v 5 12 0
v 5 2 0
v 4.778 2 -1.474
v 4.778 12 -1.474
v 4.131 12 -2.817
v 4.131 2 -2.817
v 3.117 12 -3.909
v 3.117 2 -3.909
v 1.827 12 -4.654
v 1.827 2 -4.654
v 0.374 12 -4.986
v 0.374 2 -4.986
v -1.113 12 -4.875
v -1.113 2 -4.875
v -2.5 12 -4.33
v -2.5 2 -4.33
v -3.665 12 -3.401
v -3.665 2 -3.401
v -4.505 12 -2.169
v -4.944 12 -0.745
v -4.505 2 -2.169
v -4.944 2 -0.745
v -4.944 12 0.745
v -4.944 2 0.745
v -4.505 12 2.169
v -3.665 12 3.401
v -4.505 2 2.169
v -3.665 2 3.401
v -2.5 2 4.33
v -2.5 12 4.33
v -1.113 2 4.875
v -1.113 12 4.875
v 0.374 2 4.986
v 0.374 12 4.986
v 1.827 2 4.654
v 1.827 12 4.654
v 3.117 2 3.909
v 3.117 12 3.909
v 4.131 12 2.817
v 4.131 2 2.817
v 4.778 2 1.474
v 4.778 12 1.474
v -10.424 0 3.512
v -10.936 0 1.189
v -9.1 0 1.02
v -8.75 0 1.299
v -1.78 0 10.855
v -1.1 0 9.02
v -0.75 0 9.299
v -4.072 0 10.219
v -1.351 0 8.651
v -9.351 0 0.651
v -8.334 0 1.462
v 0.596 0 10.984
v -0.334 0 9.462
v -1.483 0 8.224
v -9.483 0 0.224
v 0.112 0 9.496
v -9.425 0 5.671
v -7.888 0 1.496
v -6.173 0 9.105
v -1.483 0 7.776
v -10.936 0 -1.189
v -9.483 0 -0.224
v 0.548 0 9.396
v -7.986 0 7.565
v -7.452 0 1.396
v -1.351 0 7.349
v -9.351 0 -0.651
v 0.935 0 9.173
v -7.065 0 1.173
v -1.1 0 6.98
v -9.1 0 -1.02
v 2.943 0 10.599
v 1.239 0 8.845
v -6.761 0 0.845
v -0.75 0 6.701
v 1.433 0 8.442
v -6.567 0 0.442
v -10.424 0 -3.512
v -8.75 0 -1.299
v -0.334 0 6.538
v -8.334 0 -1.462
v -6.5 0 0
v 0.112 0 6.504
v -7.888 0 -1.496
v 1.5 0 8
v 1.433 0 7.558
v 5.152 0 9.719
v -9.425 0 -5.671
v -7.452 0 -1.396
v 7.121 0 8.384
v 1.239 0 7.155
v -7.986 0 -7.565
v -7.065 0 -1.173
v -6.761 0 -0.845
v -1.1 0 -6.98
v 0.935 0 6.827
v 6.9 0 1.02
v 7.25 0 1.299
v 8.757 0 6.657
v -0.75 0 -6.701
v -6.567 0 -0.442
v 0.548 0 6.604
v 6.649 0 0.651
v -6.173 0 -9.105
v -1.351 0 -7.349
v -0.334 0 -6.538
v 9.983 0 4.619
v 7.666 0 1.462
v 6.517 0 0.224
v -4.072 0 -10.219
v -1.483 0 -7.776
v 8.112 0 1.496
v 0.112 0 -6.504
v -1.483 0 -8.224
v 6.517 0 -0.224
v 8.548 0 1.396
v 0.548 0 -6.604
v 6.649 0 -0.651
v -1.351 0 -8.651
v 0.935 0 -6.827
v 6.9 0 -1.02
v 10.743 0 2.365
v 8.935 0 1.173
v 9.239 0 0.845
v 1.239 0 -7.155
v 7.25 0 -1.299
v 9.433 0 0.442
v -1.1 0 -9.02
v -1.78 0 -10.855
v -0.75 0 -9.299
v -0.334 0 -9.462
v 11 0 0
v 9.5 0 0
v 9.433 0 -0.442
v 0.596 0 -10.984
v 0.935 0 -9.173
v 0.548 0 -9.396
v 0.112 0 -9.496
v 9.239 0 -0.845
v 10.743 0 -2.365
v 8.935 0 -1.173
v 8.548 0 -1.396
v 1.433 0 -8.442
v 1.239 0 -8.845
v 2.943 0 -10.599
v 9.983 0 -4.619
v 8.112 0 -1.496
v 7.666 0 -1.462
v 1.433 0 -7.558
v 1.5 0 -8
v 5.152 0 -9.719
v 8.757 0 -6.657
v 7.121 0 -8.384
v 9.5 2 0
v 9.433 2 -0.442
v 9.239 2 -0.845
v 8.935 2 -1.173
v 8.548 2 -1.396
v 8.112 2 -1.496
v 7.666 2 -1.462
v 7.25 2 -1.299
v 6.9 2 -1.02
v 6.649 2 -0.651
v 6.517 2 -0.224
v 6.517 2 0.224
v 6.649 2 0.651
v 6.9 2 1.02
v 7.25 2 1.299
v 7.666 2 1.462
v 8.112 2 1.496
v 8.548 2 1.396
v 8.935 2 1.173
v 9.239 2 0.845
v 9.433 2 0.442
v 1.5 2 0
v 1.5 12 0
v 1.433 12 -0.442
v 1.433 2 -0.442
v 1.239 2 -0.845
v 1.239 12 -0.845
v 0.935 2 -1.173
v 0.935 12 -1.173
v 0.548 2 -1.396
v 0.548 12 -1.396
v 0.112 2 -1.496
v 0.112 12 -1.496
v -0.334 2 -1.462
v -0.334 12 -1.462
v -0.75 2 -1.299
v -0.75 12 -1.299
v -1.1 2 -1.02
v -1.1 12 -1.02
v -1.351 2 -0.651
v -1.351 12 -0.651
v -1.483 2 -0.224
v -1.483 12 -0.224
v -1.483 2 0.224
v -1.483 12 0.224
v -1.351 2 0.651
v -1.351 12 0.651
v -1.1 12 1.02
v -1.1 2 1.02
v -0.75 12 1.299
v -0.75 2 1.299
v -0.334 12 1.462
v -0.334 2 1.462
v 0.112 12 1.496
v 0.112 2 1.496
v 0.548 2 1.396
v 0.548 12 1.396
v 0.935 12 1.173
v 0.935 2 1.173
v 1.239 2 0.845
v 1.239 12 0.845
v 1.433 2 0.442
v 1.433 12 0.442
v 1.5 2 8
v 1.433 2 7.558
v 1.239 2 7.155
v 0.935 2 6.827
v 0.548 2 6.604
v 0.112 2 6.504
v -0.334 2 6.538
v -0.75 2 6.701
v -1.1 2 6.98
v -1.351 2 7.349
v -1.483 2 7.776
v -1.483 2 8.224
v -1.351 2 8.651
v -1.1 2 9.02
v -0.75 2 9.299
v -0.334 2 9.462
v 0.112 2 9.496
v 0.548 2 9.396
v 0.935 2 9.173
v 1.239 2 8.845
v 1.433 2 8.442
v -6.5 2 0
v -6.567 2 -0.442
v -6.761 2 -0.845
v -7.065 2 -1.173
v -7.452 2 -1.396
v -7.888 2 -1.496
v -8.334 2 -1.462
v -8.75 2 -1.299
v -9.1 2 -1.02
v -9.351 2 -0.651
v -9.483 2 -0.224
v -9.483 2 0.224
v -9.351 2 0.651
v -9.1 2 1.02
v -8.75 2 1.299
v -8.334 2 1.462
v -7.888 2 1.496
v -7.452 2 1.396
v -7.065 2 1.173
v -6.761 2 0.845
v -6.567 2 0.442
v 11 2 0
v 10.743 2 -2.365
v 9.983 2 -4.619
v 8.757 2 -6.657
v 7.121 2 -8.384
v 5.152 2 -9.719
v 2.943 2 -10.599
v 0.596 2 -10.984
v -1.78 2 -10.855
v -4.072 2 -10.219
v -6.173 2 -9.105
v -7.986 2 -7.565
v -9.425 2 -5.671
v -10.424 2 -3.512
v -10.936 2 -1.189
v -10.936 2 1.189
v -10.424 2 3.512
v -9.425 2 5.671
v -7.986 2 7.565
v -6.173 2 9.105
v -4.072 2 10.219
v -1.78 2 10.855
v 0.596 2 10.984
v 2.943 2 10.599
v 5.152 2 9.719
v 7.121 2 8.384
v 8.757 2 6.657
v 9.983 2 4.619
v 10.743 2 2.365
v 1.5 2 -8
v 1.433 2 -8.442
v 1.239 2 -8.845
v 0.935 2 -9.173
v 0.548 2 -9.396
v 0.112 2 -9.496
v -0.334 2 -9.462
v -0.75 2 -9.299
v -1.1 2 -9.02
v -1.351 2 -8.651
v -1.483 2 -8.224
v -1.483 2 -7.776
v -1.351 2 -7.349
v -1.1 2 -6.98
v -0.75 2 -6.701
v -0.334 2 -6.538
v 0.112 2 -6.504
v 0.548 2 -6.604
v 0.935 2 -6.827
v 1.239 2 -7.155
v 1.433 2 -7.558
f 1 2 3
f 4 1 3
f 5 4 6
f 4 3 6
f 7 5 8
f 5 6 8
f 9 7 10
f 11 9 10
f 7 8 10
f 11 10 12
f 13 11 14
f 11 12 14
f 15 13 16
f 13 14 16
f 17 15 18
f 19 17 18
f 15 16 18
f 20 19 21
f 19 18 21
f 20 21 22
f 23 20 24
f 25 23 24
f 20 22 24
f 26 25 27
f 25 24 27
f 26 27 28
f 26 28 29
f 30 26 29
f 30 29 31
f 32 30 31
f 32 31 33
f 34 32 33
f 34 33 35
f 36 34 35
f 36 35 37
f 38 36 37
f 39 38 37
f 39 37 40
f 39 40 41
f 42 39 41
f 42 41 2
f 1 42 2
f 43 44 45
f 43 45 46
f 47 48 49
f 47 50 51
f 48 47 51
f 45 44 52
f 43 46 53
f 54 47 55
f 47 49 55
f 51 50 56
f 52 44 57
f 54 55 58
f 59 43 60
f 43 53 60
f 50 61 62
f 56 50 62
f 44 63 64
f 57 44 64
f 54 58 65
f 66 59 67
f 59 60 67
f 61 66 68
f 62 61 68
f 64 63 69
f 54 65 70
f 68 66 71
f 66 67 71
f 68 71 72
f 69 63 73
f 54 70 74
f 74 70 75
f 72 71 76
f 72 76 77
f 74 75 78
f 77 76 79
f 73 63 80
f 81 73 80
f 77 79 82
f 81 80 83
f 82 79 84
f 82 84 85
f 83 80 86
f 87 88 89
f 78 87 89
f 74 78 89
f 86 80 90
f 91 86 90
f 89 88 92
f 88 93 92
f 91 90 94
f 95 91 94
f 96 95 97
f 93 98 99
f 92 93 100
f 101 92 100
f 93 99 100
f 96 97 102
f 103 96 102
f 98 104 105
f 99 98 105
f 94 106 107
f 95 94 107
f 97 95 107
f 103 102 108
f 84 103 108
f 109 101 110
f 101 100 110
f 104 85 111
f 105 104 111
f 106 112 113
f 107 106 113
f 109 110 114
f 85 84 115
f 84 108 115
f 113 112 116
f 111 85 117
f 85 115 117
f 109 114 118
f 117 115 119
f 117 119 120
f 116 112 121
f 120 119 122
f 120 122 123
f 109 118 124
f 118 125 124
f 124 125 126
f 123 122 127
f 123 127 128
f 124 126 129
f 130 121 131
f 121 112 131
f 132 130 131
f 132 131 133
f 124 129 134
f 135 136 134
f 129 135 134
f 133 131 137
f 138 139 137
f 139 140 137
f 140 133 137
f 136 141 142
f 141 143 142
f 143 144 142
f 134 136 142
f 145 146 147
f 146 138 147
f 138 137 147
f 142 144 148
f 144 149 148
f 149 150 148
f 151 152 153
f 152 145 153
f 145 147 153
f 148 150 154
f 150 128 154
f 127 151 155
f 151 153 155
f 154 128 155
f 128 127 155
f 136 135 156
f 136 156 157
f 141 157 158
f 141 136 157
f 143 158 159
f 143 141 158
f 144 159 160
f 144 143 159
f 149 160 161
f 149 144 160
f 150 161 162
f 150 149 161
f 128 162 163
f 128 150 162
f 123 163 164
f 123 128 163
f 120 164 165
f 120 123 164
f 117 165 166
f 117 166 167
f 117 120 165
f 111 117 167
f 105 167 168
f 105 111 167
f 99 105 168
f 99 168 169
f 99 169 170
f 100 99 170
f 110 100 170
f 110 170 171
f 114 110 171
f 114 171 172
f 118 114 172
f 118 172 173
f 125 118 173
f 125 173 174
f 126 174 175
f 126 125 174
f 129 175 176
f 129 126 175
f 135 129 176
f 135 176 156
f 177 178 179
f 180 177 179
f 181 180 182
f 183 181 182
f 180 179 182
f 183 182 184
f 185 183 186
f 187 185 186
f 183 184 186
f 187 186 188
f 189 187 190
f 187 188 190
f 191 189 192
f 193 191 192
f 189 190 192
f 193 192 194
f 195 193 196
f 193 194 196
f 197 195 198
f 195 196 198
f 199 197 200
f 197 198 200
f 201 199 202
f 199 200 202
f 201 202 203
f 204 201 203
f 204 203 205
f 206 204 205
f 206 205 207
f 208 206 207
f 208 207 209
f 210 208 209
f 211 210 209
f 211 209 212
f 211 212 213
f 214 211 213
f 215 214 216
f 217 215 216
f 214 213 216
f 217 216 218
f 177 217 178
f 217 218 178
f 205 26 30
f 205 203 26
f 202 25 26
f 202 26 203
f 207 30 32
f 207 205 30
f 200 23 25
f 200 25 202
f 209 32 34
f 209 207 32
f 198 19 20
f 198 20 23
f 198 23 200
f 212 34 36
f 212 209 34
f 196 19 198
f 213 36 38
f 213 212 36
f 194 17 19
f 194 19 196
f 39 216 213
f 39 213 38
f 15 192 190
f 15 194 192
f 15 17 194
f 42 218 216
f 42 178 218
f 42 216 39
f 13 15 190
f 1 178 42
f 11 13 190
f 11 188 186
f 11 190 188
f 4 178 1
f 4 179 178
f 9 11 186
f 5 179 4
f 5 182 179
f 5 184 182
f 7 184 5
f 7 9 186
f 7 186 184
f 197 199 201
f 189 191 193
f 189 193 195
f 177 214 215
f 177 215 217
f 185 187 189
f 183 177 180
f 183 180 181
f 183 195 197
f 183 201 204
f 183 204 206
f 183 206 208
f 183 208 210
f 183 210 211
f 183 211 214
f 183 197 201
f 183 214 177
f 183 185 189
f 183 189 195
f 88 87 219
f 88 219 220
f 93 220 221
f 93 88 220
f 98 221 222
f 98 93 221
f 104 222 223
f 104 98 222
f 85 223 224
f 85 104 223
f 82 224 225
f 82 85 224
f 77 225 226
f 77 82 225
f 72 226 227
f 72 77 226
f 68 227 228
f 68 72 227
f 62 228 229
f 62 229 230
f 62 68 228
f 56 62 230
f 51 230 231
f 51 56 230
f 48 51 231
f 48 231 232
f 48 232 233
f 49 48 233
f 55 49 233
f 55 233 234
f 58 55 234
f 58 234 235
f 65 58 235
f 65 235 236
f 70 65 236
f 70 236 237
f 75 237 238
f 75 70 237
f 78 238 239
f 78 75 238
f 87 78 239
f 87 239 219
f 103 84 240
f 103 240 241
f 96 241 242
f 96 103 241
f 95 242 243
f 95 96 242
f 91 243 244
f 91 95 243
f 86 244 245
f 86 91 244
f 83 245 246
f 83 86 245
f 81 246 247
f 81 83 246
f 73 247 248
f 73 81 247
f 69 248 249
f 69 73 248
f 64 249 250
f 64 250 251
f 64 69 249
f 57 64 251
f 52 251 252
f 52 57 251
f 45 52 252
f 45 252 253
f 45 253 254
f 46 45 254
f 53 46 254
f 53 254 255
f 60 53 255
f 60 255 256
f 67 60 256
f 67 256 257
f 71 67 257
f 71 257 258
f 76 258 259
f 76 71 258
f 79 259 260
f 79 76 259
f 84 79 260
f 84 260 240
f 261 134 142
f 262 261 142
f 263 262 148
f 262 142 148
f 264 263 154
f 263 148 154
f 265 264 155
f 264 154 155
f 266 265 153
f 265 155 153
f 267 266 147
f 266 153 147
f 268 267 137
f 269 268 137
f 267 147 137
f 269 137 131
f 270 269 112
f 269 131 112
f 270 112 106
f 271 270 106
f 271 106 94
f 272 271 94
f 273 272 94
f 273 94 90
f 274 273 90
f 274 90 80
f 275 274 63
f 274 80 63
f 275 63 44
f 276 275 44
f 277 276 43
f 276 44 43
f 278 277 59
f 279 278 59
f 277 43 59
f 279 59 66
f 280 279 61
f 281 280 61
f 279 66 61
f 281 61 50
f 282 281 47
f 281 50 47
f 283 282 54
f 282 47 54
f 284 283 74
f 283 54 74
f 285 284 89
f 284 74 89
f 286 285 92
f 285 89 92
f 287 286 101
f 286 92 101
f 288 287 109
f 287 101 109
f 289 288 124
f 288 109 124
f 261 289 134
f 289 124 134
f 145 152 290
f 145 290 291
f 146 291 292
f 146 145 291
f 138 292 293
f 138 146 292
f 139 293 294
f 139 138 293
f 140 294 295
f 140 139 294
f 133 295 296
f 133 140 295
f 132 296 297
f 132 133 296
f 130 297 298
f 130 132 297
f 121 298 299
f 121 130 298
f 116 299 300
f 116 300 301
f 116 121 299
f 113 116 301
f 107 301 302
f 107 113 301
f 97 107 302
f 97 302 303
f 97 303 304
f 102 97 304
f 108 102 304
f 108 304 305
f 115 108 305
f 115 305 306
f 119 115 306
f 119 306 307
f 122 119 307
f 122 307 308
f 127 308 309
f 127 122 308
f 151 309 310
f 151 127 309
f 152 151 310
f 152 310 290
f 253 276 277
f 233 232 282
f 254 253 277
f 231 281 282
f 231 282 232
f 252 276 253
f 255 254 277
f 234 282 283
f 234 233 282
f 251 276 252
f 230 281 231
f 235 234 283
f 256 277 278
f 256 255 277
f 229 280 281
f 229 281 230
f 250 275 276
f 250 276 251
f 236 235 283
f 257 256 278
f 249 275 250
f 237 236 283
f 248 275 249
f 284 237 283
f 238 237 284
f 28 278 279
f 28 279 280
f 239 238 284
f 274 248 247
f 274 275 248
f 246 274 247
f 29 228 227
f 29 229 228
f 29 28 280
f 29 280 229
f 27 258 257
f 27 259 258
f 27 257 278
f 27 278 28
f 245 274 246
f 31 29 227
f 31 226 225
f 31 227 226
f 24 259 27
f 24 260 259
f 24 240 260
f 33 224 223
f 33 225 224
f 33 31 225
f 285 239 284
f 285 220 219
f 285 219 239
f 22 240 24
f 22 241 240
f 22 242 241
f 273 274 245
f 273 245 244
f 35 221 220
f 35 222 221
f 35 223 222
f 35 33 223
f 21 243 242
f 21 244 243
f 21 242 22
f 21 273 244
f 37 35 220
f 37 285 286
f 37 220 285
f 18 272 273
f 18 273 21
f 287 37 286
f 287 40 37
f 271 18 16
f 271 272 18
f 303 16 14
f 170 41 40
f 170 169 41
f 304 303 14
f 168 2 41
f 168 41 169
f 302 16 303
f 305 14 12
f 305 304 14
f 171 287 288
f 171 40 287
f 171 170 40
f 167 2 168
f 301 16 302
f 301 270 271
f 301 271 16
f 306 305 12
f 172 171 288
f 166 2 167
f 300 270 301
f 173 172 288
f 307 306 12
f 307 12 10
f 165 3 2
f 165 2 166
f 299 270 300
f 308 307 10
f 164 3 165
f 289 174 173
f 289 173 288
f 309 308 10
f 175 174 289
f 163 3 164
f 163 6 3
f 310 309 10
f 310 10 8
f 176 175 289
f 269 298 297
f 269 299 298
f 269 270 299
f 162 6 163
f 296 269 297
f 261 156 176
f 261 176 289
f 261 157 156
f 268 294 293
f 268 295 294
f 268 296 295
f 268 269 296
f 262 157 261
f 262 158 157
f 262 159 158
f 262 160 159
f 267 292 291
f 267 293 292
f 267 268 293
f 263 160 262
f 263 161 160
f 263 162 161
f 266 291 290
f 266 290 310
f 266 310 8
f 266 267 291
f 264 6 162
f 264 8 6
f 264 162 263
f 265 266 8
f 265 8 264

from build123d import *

# Parameters (mm, degrees)
SKETCH1_R           = 11
SKETCH1_R_2         = 1.5
SKETCH1_R_3         = 5
BOSS_EXTRUDE1_DEPTH = 2
SKETCH1_3_R         = 5
BOSS_EXTRUDE2_DEPTH = 12
SKETCH2_R           = 1.5
CUT_EXTRUDE1_DEPTH  = 10


with BuildPart() as part:
    # Sketch1 → Boss-Extrude1 (new body)
    with BuildSketch(Plane(origin=(0, 0, 0), x_dir=(1, 0, 0), z_dir=(0, 1, 0))):
        Circle(SKETCH1_R)
        with Locations((0, -8)):
            Circle(SKETCH1_R_2, mode=Mode.SUBTRACT)
        with Locations((-8, 0)):
            Circle(SKETCH1_R_2, mode=Mode.SUBTRACT)
        Circle(SKETCH1_R_3, mode=Mode.SUBTRACT)
        with BuildLine():
            ThreePointArc((6.5, 0), (8, 1.5), (9.5, 0))
            ThreePointArc((9.5, 0), (8, -1.5), (6.5, 0))
        make_face(mode=Mode.SUBTRACT)
        with Locations((0, 8)):
            Circle(SKETCH1_R_2, mode=Mode.SUBTRACT)
    extrude(amount=BOSS_EXTRUDE1_DEPTH)

    # Sketch1<3> → Boss-Extrude2 (add)
    with BuildSketch(Plane(origin=(0, 0, 0), x_dir=(1, 0, 0), z_dir=(0, 1, 0))):
        Circle(SKETCH1_3_R)
    extrude(amount=BOSS_EXTRUDE2_DEPTH)

    # Sketch2 → Cut-Extrude1 (cut)
    with BuildSketch(Plane(origin=(0, 12, 0), x_dir=(1, 0, 0), z_dir=(0, 1, 0))):
        Circle(SKETCH2_R)
    extrude(amount=-CUT_EXTRUDE1_DEPTH, mode=Mode.SUBTRACT)


solid = part.part
